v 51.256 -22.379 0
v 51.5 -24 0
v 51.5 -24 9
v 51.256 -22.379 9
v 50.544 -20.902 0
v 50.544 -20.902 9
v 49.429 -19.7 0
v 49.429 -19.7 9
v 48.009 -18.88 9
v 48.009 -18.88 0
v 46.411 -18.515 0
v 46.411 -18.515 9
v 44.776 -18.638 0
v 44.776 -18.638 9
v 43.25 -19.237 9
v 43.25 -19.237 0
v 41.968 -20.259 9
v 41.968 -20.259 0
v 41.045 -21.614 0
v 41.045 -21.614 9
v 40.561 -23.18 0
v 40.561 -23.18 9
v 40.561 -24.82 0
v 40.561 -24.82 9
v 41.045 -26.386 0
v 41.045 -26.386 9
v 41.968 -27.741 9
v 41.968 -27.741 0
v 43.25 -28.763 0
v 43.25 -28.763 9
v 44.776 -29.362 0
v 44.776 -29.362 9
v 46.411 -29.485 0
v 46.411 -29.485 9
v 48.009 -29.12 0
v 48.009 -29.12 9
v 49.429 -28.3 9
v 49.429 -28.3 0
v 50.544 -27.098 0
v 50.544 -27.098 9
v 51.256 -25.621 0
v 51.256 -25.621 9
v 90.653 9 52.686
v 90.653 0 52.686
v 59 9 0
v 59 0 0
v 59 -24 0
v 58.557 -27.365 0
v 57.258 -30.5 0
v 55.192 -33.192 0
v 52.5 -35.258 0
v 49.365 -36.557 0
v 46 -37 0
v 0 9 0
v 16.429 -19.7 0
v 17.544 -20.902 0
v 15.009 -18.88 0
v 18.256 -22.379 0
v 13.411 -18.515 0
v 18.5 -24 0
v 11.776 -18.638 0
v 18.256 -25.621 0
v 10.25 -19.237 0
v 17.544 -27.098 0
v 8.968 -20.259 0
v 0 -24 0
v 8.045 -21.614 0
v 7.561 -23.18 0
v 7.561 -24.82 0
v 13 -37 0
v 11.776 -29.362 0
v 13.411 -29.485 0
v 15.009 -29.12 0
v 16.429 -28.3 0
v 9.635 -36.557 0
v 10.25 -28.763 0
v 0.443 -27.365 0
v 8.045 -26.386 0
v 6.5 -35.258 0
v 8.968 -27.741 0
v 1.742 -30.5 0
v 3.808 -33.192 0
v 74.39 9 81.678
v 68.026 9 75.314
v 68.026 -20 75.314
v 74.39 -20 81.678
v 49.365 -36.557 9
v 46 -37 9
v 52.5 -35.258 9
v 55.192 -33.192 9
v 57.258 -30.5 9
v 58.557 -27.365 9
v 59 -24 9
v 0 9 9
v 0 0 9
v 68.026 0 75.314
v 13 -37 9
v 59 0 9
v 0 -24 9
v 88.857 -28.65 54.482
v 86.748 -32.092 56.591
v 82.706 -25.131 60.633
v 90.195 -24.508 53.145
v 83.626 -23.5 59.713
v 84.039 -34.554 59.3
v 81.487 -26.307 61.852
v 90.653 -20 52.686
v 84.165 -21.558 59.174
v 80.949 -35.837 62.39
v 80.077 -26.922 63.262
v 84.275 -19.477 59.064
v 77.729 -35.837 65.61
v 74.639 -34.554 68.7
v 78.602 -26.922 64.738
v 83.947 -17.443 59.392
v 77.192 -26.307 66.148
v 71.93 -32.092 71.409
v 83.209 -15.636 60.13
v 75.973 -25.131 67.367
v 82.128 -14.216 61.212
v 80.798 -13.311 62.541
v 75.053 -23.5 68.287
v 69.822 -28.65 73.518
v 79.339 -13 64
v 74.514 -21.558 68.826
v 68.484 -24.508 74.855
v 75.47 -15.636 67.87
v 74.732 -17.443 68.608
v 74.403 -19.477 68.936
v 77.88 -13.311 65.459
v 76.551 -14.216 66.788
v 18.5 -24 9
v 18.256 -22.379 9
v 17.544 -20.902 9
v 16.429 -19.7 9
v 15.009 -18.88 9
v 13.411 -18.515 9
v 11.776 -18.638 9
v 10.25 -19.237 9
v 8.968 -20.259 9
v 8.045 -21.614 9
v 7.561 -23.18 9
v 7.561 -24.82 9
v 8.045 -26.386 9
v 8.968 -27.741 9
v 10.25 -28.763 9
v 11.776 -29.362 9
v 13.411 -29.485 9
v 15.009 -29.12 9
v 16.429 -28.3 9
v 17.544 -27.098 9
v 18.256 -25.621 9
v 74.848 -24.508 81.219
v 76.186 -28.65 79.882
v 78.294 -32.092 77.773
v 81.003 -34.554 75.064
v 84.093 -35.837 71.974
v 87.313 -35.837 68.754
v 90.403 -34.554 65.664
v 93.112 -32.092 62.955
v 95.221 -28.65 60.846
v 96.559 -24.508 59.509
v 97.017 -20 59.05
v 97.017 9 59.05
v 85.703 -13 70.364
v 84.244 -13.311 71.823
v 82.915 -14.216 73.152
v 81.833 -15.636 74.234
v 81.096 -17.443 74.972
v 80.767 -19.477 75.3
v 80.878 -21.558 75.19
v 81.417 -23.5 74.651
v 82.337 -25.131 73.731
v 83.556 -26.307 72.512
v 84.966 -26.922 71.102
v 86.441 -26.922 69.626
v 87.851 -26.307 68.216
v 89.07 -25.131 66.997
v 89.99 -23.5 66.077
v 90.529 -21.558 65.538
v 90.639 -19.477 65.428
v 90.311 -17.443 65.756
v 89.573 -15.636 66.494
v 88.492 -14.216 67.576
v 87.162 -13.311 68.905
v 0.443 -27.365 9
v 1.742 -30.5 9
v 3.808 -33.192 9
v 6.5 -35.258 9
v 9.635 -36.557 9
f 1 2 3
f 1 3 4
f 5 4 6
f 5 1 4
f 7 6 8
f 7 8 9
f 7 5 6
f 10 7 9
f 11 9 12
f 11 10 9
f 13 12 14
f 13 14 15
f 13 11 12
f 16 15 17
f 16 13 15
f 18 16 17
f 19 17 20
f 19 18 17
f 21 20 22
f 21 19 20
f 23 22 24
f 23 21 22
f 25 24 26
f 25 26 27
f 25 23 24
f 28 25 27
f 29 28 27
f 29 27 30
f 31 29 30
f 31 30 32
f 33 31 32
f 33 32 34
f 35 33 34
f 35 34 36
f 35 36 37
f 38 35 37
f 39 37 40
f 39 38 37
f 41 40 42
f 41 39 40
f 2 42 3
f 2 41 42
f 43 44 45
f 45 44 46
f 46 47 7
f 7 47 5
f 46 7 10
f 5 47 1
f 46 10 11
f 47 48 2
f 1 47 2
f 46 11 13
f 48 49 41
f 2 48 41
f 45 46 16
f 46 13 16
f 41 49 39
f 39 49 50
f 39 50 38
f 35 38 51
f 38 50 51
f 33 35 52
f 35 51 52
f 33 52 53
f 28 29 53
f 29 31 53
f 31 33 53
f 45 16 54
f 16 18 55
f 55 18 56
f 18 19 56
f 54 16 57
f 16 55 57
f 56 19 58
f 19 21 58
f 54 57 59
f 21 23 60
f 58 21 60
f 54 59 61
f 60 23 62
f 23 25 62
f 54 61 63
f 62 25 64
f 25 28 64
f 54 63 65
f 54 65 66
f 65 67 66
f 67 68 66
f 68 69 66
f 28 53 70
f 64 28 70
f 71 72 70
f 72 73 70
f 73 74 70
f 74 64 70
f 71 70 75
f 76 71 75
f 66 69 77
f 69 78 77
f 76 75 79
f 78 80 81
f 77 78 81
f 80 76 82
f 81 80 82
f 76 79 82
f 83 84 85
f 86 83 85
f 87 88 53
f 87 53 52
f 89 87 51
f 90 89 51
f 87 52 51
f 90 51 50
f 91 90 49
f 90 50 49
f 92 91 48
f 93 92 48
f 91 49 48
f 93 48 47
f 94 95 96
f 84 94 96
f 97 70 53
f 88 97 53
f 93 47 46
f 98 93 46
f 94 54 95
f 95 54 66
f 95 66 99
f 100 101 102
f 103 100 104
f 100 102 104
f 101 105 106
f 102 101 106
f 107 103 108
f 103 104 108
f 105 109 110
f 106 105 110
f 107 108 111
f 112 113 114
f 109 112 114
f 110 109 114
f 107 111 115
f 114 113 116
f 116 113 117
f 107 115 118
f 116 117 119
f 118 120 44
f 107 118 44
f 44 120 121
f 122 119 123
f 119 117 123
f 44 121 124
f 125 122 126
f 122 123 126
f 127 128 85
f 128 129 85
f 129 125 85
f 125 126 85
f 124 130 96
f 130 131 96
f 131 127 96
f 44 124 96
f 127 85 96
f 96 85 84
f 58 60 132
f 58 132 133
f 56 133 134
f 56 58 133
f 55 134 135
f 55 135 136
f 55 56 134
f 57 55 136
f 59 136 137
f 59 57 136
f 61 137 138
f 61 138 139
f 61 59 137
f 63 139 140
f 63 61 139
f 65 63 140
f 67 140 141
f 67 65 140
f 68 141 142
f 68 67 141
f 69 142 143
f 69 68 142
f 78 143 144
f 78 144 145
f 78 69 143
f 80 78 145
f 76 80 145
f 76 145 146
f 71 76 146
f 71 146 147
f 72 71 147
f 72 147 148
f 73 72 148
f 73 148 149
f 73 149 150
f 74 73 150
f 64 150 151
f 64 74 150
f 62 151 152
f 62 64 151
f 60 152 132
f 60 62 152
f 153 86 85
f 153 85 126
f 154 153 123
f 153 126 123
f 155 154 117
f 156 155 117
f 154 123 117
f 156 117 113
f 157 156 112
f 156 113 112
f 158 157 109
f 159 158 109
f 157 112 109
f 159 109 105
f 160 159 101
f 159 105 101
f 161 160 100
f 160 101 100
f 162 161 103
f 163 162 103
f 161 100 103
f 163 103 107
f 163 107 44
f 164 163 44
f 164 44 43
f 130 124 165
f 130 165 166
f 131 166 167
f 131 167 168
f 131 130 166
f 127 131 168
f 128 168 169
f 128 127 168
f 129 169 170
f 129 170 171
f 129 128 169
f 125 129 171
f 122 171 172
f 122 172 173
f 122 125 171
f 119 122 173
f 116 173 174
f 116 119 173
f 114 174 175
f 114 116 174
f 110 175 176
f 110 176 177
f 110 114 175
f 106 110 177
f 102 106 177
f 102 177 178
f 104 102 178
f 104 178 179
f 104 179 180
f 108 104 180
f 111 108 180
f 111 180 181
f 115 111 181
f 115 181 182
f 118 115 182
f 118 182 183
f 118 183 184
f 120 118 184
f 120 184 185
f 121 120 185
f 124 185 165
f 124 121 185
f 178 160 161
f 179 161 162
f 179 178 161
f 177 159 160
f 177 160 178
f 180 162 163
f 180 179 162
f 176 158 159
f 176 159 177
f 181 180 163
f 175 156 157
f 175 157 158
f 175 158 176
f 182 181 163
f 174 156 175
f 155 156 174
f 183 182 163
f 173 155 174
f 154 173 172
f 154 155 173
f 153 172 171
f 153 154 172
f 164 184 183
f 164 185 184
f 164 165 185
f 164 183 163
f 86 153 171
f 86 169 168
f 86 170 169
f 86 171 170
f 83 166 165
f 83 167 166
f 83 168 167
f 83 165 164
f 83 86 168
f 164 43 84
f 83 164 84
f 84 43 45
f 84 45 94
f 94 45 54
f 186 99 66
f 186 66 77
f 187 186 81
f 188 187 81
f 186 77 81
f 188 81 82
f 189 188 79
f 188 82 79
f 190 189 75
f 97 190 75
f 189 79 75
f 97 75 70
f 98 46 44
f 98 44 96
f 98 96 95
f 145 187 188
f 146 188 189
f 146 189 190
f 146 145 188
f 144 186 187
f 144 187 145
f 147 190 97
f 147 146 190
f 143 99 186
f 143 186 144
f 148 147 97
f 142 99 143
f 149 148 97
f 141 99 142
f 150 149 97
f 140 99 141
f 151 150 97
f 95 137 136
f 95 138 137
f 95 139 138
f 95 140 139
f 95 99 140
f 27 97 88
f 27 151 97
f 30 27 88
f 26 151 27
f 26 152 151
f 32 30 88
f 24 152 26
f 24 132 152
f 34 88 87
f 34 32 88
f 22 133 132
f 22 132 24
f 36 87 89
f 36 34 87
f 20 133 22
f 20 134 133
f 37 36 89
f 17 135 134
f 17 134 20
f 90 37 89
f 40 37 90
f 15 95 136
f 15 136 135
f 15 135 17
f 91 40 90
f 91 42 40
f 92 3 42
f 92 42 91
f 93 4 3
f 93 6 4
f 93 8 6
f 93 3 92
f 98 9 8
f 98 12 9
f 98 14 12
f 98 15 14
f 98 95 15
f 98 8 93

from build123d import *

# Parameters (mm, degrees)
F0_R     = 5.5
F1_DEPTH = 9
F2_W     = 59
F2_H     = 9
F3_DEPTH = 9
F4_R     = 7
F4_W     = 9
F4_H     = 32
F5_DEPTH = 9


with BuildPart() as f1:
    # F0 (on Top) → F1 (new body)
    with BuildSketch(Plane.XY):
        with BuildLine():
            Line((59, 0), (0, 0))
            Line((0, 0), (0, -24))
            ThreePointArc((0, -24), (3.807612, -33.192388), (13, -37))
            Line((13, -37), (46, -37))
            ThreePointArc((46, -37), (55.192388, -33.192388), (59, -24))
            Line((59, -24), (59, 0))
        make_face()
        with Locations((13, -24)):
            Circle(F0_R, mode=Mode.SUBTRACT)
        with Locations((46, -24)):
            Circle(F0_R, mode=Mode.SUBTRACT)
    extrude(amount=F1_DEPTH)

    # F2 (on face) → F3 (join)
    with BuildSketch(Plane(origin=(0, 0, 0), x_dir=(-1, 0, 0), z_dir=(0, 1, 0))):
        Polygon((-90.653089, 52.686292), (-59, 0), (-59, 9), (0, 9), (-68.025672, 75.313708), align=None)
        with Locations((-29.5, 4.5)):
            Rectangle(F2_W, F2_H)
    extrude(amount=F3_DEPTH)

    # F4 (on face) → F5 (join)
    with BuildSketch(Plane(origin=(71.66969, 0, 71.66969), x_dir=(0, 1, 0), z_dir=(0.707107, 0, 0.707107))):
        with BuildLine():
            Line((0, -26.84658), (0, 5.15342))
            Line((0, 5.15342), (-20, 5.15342))
            ThreePointArc((-20, 5.15342), (-36, -10.84658), (-20, -26.84658))
            Line((-20, -26.84658), (0, -26.84658))
        make_face()
        with Locations((-20, -10.84658)):
            Circle(F4_R, mode=Mode.SUBTRACT)
        with Locations((4.5, -10.84658)):
            Rectangle(F4_W, F4_H)
    extrude(amount=F5_DEPTH)


solid = f1.part
